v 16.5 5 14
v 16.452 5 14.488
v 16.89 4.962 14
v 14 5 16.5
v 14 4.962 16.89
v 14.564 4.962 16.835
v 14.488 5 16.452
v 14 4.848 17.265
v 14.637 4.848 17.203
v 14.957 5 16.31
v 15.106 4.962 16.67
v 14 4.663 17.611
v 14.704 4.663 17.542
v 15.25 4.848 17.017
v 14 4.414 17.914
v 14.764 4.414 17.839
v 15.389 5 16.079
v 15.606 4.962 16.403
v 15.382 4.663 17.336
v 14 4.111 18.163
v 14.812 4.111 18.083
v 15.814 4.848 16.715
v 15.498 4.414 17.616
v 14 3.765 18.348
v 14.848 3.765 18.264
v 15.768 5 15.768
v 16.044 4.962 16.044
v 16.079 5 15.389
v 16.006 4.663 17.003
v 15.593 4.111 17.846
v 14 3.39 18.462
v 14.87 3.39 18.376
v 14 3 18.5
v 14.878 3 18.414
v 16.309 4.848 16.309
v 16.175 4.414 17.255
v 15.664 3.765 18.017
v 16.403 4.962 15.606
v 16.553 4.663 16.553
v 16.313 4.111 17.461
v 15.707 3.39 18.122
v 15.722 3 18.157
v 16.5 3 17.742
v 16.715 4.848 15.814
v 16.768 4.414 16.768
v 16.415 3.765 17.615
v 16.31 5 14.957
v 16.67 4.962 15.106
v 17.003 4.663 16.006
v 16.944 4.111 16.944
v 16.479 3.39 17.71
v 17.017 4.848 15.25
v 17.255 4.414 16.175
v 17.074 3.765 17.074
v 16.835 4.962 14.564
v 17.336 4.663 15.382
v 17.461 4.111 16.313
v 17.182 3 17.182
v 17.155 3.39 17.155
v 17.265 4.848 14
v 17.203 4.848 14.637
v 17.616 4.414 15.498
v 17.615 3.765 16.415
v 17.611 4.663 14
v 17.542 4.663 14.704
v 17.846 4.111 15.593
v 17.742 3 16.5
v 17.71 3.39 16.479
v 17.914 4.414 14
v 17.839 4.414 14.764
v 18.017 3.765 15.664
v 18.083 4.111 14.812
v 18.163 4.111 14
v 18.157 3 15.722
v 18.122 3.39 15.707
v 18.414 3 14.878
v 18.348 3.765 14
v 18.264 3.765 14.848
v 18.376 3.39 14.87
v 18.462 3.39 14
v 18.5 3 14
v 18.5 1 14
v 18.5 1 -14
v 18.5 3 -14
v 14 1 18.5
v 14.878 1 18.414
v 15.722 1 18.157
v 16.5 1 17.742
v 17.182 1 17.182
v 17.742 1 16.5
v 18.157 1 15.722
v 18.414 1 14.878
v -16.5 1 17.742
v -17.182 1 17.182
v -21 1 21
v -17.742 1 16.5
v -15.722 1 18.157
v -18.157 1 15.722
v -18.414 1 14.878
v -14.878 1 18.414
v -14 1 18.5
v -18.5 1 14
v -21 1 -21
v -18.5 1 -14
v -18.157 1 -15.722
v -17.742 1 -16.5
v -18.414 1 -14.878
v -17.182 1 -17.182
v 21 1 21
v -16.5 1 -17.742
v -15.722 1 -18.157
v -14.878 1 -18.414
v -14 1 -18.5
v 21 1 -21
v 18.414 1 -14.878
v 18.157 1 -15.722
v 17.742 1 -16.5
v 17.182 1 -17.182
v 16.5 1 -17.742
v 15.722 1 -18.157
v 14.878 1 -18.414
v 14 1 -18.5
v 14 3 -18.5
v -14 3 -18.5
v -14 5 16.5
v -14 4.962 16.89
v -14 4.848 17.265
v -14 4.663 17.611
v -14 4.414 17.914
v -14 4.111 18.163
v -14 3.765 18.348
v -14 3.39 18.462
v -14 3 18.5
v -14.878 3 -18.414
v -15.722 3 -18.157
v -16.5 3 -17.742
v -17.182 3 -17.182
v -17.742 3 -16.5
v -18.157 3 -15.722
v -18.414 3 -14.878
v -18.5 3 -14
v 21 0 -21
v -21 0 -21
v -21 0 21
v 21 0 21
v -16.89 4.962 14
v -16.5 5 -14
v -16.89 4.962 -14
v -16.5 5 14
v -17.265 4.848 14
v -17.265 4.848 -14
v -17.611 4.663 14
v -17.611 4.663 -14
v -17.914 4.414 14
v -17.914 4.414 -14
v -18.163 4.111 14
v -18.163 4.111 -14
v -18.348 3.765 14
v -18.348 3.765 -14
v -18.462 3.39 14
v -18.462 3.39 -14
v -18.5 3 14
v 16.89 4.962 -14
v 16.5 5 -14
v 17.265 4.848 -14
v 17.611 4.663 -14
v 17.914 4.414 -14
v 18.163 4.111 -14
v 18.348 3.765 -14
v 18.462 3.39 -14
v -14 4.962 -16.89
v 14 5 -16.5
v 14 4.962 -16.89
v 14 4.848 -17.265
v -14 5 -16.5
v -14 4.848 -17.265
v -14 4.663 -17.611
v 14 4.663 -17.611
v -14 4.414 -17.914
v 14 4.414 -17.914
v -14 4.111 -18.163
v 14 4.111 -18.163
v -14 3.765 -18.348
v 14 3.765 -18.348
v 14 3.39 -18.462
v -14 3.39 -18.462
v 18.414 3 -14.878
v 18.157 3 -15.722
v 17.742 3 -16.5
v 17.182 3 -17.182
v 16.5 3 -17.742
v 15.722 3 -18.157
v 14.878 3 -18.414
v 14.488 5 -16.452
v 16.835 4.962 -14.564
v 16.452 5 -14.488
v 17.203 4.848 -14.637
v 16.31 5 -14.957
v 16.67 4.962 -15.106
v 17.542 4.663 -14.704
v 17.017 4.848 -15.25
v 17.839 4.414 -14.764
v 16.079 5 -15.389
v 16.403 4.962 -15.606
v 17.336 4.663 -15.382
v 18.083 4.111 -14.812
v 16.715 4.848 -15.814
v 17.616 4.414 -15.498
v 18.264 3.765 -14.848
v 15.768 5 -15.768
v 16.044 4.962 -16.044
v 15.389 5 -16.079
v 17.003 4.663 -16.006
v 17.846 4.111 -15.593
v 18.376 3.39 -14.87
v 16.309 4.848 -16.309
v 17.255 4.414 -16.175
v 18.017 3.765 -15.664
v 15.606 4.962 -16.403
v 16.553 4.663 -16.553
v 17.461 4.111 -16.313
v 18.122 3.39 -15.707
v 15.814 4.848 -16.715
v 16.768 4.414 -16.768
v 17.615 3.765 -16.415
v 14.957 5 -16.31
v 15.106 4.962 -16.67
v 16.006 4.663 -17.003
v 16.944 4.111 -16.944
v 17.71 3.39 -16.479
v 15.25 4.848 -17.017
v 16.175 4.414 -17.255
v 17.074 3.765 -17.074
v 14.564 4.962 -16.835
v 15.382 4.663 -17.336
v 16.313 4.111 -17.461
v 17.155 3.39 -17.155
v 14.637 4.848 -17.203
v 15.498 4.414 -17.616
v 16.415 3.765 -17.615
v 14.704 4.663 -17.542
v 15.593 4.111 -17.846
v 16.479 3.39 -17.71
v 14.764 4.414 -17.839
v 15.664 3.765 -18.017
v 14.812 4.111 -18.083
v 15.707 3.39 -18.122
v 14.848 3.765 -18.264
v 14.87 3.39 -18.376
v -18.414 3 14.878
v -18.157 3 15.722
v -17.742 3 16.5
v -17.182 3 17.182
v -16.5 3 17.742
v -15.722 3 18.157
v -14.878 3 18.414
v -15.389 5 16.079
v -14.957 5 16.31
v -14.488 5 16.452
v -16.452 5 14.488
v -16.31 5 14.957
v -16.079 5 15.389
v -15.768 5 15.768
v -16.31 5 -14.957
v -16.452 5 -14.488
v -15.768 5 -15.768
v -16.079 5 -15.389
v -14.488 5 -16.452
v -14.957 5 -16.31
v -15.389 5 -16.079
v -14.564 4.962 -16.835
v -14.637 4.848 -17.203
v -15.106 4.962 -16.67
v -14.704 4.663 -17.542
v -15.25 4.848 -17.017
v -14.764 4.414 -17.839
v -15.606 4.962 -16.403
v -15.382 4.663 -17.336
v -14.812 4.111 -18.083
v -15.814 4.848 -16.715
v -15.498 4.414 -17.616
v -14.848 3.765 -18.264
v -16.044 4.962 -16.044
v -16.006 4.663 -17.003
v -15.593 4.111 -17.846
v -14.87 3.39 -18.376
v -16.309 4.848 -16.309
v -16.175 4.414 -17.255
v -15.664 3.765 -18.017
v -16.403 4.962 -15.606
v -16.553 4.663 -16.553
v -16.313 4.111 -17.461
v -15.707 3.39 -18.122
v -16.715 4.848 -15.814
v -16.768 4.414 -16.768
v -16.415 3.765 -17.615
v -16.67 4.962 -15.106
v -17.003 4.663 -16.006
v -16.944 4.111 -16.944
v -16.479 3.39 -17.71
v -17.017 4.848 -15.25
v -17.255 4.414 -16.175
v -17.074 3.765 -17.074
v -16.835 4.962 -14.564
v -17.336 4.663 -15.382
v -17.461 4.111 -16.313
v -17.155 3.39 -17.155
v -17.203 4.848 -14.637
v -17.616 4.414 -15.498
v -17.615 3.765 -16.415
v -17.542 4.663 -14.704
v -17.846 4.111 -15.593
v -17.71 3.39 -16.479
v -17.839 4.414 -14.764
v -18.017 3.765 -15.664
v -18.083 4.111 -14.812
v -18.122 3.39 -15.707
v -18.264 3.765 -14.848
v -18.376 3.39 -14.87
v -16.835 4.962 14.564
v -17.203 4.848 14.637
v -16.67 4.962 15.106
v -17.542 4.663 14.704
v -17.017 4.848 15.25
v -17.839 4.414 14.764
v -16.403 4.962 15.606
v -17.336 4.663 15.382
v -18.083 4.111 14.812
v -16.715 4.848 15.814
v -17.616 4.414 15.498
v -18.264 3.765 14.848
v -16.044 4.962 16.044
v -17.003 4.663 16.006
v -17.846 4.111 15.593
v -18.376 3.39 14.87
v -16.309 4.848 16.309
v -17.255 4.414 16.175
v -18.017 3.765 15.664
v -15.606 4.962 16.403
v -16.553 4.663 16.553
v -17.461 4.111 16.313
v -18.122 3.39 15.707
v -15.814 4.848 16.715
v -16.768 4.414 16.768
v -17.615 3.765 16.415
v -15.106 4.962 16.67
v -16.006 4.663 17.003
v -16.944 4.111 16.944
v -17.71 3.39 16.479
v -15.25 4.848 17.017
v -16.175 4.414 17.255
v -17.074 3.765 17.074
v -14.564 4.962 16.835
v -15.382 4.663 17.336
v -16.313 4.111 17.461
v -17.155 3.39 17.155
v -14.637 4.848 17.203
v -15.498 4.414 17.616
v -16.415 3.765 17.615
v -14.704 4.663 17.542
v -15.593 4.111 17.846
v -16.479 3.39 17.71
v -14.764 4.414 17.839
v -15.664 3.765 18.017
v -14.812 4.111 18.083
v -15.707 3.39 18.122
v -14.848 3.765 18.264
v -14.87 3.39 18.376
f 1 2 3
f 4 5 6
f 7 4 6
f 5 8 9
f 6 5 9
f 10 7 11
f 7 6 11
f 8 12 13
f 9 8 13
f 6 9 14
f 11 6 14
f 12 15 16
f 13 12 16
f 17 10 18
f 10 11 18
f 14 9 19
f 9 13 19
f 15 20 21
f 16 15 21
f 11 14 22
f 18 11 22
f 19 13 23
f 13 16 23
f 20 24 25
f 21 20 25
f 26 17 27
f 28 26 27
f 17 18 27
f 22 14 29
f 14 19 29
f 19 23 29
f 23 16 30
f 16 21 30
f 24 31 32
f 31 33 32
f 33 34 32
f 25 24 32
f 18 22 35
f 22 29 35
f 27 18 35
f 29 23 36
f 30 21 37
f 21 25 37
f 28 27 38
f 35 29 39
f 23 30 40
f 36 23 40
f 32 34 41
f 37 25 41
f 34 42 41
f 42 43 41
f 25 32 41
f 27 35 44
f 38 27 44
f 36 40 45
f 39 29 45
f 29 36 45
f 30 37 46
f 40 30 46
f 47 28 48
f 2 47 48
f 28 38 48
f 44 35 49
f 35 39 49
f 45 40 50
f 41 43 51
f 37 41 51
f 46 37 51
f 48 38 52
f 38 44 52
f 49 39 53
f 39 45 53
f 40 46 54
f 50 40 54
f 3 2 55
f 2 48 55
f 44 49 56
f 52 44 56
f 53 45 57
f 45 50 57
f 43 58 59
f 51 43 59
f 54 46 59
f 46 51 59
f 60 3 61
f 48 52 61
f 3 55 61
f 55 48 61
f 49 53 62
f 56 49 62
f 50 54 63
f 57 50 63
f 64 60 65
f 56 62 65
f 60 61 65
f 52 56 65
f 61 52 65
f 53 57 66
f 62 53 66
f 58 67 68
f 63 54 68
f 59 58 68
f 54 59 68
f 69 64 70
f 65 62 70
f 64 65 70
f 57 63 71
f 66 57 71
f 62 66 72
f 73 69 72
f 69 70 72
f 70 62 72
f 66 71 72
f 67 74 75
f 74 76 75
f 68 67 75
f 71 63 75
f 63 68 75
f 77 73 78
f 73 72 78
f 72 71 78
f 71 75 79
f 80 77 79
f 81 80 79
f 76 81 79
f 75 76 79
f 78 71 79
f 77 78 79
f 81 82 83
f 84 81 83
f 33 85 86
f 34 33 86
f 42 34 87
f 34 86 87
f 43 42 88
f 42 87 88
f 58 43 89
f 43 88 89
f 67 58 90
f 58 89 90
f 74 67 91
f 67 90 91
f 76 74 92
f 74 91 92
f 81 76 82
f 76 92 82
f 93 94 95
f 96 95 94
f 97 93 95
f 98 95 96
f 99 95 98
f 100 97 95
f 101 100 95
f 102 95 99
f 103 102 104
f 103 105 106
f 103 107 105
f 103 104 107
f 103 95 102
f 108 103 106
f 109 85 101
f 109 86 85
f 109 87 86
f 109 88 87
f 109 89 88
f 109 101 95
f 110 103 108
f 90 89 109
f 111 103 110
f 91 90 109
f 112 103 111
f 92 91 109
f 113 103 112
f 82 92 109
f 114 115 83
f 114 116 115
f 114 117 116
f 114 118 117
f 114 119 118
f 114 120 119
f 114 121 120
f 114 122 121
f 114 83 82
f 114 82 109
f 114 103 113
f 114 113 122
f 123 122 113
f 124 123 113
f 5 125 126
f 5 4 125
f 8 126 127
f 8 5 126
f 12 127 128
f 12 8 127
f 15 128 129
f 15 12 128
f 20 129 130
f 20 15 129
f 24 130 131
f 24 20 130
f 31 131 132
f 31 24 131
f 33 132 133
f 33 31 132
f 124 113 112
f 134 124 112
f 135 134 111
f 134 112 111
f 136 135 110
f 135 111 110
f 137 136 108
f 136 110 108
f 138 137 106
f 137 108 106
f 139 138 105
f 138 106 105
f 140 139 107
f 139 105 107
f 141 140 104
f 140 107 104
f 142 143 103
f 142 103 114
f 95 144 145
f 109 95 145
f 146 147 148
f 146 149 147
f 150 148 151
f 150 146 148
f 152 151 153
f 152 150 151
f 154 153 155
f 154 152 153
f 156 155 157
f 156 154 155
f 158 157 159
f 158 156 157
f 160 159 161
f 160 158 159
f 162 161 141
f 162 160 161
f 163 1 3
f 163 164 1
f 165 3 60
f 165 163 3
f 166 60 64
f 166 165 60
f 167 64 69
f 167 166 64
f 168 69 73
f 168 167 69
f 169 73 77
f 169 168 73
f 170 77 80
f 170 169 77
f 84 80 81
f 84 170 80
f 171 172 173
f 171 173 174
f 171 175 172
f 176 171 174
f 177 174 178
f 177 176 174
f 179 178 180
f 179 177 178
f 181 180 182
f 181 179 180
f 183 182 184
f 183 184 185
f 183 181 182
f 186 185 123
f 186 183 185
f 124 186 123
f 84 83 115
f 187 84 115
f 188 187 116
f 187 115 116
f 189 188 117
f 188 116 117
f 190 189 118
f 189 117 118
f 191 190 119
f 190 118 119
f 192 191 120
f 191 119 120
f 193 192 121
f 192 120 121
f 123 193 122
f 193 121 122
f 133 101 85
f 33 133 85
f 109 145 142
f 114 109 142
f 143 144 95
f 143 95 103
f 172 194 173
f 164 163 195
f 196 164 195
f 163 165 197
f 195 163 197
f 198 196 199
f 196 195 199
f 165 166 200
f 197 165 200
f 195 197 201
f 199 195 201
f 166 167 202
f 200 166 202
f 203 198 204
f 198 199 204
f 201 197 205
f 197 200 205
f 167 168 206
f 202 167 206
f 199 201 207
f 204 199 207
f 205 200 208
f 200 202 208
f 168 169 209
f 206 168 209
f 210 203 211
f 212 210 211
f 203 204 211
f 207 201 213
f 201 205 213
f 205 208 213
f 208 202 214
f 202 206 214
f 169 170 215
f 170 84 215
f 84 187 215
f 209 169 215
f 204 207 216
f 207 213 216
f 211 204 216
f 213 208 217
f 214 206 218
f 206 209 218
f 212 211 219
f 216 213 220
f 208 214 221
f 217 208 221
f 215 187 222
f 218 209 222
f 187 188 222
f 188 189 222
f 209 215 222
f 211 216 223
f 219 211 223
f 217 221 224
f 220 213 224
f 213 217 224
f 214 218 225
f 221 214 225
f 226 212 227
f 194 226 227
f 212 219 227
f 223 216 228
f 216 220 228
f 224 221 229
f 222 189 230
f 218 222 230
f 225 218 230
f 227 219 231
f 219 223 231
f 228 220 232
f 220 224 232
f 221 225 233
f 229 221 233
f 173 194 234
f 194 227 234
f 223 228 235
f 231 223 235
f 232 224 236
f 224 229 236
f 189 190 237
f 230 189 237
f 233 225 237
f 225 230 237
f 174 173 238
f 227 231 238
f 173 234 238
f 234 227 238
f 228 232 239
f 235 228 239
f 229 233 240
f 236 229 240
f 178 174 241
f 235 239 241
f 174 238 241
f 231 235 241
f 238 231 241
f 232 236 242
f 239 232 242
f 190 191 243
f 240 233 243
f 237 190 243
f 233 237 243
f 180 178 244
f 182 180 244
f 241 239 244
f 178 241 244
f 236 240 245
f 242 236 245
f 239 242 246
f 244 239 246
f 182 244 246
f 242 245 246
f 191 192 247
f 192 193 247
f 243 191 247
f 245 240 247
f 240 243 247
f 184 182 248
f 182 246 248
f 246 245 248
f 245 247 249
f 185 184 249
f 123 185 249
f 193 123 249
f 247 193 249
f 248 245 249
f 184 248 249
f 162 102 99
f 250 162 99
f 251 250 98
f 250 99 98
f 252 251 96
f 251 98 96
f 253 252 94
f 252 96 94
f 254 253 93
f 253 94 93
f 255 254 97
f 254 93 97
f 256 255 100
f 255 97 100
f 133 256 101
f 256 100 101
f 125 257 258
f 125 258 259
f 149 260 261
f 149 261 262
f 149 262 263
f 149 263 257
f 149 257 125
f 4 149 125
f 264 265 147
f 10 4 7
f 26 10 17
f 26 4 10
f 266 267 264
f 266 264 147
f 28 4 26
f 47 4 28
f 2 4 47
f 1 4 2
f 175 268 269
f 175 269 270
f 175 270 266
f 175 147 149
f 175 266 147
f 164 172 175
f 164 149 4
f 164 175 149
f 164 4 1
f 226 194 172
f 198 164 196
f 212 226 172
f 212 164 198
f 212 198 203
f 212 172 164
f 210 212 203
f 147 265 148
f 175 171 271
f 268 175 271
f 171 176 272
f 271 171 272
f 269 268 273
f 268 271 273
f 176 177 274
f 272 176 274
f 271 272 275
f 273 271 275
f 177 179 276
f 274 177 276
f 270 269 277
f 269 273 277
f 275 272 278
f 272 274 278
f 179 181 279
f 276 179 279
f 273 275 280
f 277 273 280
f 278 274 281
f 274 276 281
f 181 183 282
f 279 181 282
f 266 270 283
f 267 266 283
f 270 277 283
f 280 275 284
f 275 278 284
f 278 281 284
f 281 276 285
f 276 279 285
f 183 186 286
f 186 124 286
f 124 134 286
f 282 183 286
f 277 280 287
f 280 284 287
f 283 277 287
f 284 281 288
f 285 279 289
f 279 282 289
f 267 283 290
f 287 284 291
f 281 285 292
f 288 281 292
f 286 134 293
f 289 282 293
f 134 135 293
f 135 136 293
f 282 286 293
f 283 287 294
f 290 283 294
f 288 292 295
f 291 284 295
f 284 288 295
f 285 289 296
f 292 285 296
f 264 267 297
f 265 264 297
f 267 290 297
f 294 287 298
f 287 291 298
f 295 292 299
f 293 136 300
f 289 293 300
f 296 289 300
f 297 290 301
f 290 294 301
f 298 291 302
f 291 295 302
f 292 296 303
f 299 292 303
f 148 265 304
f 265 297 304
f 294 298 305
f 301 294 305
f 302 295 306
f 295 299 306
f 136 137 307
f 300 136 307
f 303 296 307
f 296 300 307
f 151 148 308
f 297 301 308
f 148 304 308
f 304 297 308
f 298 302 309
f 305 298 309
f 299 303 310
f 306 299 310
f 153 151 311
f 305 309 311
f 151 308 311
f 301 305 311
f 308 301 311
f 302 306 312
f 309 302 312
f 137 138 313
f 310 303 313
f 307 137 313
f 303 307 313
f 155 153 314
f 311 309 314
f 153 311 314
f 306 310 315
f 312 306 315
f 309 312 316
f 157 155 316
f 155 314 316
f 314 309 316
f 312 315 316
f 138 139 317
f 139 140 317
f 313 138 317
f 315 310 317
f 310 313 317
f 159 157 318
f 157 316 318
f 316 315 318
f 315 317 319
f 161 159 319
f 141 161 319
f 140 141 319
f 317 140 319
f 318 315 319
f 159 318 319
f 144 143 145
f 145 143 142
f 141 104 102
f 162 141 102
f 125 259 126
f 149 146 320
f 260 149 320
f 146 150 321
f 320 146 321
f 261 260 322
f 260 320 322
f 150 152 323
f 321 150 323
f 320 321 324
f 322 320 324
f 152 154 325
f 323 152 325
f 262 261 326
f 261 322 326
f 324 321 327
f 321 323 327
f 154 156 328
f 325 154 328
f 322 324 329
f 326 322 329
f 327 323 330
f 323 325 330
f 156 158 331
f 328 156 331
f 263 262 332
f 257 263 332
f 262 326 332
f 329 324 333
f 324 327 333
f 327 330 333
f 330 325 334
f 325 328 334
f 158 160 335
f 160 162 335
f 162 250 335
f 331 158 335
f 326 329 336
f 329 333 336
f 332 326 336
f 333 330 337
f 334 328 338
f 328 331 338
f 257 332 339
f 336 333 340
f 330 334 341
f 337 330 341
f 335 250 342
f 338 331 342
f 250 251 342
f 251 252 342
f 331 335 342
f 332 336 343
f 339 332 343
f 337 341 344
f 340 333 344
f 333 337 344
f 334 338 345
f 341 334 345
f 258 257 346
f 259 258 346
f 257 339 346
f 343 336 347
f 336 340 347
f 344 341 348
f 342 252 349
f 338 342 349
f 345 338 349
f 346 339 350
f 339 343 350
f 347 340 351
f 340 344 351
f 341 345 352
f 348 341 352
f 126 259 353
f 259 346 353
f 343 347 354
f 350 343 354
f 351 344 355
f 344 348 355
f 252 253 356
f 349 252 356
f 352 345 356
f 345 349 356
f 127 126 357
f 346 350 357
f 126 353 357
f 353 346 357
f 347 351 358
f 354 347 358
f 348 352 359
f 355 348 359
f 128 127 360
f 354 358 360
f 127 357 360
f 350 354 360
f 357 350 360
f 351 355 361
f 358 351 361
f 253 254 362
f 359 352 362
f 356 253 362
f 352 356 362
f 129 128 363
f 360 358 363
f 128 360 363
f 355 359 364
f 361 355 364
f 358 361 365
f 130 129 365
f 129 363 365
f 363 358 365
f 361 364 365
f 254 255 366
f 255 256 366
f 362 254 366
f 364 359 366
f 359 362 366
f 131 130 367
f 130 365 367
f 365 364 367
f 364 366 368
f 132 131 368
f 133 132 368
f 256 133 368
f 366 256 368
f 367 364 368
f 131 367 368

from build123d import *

# Parameters (mm, degrees)
SKETCH1_W           = 42
SKETCH1_H           = 42
BOSS_EXTRUDE1_DEPTH = 1
BOSS_EXTRUDE2_DEPTH = 5
FILLET1_R           = 2


with BuildPart() as part:
    # Sketch1 → Boss-Extrude1 (new body)
    with BuildSketch(Plane(origin=(0, 0, 0), x_dir=(1, 0, 0), z_dir=(0, 1, 0))):
        Rectangle(SKETCH1_W, SKETCH1_H)
        with BuildLine():
            Line((-14, -18.5), (14, -18.5))
            ThreePointArc((14, -18.5), (17.181980515, -17.181980515), (18.5, -14))
            Line((18.5, -14), (18.5, 14))
            ThreePointArc((18.5, 14), (17.181980515, 17.181980515), (14, 18.5))
            Line((14, 18.5), (-14, 18.5))
            ThreePointArc((-14, 18.5), (-17.181980515, 17.181980515), (-18.5, 14))
            Line((-18.5, 14), (-18.5, -14))
            ThreePointArc((-18.5, -14), (-17.181980515, -17.181980515), (-14, -18.5))
        make_face(mode=Mode.SUBTRACT)
    extrude(amount=BOSS_EXTRUDE1_DEPTH)

    # Sketch1<2> → Boss-Extrude2 (add)
    with BuildSketch(Plane(origin=(0, 0, 0), x_dir=(1, 0, 0), z_dir=(0, 1, 0))):
        with BuildLine():
            Line((18.5, -14), (18.5, 14))
            ThreePointArc((18.5, 14), (17.181980515, 17.181980515), (14, 18.5))
            Line((14, 18.5), (-14, 18.5))
            ThreePointArc((-14, 18.5), (-17.181980515, 17.181980515), (-18.5, 14))
            Line((-18.5, 14), (-18.5, -14))
            ThreePointArc((-18.5, -14), (-17.181980515, -17.181980515), (-14, -18.5))
            Line((-14, -18.5), (14, -18.5))
            ThreePointArc((14, -18.5), (17.181980515, -17.181980515), (18.5, -14))
        make_face()
    extrude(amount=BOSS_EXTRUDE2_DEPTH)

    # Fillet1
    fillet1_edges = [part.edges().sort_by_distance(p)[0] for p in [
        (0, 5, -18.5),
        (-18.5, 5, 0),
        (17.181980515, 5, 17.181980515),
        (18.5, 5, 0),
        (17.181980515, 5, -17.181980515),
        (-17.181980515, 5, -17.181980515),
        (-17.181980515, 5, 17.181980515),
        (0, 5, 18.5),
    ]]
    fillet(fillet1_edges, radius=FILLET1_R)


solid = part.part
